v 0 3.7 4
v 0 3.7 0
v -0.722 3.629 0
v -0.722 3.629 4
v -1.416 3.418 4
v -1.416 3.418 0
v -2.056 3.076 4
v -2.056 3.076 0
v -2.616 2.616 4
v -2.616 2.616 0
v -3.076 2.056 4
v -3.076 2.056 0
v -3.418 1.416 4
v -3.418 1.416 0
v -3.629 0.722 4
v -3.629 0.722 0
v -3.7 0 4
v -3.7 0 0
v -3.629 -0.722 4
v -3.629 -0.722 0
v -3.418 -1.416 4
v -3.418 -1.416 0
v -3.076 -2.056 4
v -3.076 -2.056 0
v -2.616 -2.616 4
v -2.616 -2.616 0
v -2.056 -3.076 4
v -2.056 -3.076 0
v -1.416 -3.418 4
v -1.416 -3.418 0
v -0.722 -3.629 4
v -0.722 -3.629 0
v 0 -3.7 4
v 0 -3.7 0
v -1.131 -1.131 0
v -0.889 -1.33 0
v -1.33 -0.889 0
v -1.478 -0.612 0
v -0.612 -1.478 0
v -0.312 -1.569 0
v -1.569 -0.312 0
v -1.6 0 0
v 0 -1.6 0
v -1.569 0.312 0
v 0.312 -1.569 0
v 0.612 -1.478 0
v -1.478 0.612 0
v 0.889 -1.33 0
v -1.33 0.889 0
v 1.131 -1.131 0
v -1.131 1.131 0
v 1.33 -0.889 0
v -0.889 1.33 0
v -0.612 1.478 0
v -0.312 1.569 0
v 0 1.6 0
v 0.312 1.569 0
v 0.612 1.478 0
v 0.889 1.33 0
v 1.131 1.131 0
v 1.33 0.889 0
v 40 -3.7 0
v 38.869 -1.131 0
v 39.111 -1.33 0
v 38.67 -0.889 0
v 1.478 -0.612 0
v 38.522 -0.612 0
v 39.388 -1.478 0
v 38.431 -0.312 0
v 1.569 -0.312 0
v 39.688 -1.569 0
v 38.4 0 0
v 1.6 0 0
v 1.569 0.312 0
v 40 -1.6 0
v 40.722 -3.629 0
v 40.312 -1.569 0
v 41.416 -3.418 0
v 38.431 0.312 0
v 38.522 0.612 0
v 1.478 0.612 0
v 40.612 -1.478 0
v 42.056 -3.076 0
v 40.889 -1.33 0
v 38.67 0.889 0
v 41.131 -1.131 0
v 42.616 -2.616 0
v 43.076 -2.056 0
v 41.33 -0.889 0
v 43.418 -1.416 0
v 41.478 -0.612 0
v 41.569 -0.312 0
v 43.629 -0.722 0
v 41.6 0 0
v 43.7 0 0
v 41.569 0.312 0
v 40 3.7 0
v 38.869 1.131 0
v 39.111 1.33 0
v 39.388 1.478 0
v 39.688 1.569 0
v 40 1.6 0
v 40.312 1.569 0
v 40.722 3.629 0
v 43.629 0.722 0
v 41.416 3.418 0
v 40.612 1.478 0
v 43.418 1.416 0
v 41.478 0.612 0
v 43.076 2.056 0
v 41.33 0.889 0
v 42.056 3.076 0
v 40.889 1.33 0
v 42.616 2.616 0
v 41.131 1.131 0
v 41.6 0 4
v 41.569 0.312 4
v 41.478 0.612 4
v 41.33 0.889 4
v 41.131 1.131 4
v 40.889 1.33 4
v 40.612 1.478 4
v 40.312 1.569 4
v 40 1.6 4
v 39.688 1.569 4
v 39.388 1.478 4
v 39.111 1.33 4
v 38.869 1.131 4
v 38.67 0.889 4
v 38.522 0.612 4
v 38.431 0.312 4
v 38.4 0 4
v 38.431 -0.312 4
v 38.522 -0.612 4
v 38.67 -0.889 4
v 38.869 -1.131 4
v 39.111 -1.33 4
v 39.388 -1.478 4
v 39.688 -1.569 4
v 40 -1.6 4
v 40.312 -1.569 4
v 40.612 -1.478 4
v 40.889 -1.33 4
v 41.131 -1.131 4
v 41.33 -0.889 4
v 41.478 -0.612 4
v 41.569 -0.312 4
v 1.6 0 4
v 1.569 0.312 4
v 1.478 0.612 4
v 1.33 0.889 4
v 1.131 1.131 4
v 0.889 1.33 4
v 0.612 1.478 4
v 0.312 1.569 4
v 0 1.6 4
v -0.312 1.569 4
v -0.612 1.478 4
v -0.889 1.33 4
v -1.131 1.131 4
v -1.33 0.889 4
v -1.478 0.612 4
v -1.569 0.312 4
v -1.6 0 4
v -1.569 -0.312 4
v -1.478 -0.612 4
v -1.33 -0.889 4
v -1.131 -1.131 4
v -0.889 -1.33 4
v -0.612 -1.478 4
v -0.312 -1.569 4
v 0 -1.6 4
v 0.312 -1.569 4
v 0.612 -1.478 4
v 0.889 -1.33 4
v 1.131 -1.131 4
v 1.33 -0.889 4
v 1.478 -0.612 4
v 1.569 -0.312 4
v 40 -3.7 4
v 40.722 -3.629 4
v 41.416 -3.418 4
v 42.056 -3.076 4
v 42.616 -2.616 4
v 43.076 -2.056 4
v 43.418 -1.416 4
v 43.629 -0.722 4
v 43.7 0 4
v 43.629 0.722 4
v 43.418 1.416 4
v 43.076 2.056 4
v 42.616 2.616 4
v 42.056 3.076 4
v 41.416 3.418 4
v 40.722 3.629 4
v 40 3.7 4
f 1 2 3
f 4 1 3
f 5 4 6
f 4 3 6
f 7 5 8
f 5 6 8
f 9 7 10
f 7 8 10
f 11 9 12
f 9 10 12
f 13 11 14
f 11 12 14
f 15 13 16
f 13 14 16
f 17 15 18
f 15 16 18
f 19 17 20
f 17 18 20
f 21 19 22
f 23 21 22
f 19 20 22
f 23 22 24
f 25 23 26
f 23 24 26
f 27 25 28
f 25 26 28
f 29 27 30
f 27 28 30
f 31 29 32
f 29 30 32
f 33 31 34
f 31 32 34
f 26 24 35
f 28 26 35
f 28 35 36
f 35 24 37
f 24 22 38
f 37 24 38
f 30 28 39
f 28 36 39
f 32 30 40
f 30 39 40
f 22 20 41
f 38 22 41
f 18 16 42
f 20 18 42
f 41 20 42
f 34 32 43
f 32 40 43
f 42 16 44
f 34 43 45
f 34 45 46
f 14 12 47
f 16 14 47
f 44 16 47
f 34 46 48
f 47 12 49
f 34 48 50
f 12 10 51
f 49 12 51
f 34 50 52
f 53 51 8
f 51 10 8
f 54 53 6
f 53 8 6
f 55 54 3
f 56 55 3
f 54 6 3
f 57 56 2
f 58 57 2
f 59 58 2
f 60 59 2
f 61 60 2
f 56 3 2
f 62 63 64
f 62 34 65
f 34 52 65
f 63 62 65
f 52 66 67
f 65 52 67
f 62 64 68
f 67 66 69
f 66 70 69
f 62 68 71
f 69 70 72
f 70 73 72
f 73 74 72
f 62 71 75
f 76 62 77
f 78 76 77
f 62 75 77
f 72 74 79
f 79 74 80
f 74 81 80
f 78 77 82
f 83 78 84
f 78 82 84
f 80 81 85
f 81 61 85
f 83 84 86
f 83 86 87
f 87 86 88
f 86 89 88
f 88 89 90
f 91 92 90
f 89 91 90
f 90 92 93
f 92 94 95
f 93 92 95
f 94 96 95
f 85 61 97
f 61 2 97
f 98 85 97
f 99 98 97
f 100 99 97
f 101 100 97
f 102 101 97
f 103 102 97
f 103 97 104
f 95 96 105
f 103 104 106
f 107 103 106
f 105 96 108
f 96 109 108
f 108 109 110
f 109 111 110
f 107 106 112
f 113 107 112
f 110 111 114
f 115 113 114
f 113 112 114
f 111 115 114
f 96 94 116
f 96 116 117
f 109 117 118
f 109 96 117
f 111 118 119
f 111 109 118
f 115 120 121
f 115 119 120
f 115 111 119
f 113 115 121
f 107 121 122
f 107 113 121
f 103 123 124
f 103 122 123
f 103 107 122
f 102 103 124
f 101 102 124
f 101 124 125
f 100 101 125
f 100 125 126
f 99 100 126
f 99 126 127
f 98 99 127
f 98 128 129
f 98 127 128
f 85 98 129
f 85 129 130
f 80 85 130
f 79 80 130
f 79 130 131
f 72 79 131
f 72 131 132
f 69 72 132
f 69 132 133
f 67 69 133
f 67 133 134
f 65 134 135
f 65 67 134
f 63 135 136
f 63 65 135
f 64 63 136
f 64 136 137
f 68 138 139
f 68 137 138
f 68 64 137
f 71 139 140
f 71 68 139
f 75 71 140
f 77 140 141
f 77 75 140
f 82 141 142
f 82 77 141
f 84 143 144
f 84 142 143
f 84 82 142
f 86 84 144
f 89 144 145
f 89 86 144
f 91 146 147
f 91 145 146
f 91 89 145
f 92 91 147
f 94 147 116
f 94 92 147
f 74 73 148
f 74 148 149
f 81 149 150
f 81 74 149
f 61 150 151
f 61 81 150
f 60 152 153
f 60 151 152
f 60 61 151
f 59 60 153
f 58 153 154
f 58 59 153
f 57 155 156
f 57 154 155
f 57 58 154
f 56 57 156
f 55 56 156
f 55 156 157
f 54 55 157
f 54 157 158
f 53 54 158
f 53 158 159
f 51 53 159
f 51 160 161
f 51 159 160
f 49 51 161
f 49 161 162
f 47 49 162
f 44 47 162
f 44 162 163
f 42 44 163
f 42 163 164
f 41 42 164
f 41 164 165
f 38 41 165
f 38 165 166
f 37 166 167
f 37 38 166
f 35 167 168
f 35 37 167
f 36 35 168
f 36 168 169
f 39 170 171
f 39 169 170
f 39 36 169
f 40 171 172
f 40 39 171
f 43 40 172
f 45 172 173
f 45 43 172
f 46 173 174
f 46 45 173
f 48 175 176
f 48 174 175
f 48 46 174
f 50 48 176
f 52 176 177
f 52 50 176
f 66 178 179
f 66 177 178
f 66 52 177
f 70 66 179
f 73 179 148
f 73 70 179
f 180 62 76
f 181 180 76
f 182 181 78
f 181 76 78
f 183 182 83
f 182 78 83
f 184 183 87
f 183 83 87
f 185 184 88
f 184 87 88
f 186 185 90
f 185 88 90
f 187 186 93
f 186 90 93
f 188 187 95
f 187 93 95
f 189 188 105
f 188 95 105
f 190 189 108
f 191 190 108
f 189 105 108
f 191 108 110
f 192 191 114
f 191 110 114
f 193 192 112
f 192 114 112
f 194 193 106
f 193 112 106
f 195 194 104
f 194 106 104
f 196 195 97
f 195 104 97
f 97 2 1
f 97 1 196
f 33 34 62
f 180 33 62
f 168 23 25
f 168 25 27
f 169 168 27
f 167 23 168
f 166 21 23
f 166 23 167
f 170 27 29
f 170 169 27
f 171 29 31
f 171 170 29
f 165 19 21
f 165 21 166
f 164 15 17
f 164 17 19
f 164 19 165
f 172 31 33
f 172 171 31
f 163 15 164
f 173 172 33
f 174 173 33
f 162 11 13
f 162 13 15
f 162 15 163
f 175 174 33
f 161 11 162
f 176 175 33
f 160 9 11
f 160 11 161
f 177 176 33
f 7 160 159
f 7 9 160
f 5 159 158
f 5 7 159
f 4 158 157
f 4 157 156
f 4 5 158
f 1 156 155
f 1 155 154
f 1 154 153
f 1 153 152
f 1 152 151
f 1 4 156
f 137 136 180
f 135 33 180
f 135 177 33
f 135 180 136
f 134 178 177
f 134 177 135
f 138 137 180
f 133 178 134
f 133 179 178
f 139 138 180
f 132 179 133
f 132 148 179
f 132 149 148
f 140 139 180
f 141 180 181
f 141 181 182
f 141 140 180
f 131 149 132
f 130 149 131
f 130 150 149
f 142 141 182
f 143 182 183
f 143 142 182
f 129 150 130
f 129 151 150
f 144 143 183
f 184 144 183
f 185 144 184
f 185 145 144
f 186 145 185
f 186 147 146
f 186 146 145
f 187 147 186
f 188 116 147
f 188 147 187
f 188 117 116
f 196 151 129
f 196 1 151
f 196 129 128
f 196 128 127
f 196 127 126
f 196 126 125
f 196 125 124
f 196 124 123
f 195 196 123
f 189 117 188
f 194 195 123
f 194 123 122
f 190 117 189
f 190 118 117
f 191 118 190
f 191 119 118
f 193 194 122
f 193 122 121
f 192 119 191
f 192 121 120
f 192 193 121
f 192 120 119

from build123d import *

# Parameters (mm, degrees)
CYLINDER005_R     = 1.6
CYLINDER005_DEPTH = 30
PAD002_DEPTH      = 4


with BuildPart() as finger_drill_master:
    # Cylinder005 → Cylinder005 (new body)
    with BuildSketch(Plane.XY.offset(-8)):
        Circle(CYLINDER005_R)
    extrude(amount=CYLINDER005_DEPTH)


with BuildPart() as clone006:
    # Clone006 base: copy of finger-drill-master
    add(finger_drill_master.part)


with BuildPart() as clone006_1:
    # Clone006 placement: moved
    add(clone006.part.moved(Location((40, 0, 0))))


with BuildPart() as fusion012:
    # Clone005 base: copy of finger-drill-master
    add(finger_drill_master.part)

    # Fusion012: union Clone006
    add(clone006_1.part)


with BuildPart() as link_master:
    # Sketch002 → Pad002 (new body)
    with BuildSketch(Plane.XY):
        with BuildLine():
            ThreePointArc((0, 3.7), (-3.7, 0), (0, -3.7))
            Line((0, -3.7), (40, -3.7))
            ThreePointArc((40, -3.7), (43.7, 0), (40, 3.7))
            Line((0, 3.7), (40, 3.7))
        make_face()
    extrude(amount=PAD002_DEPTH)

    # Cut001: cut Fusion012
    add(fusion012.part, mode=Mode.SUBTRACT)


solid = link_master.part
